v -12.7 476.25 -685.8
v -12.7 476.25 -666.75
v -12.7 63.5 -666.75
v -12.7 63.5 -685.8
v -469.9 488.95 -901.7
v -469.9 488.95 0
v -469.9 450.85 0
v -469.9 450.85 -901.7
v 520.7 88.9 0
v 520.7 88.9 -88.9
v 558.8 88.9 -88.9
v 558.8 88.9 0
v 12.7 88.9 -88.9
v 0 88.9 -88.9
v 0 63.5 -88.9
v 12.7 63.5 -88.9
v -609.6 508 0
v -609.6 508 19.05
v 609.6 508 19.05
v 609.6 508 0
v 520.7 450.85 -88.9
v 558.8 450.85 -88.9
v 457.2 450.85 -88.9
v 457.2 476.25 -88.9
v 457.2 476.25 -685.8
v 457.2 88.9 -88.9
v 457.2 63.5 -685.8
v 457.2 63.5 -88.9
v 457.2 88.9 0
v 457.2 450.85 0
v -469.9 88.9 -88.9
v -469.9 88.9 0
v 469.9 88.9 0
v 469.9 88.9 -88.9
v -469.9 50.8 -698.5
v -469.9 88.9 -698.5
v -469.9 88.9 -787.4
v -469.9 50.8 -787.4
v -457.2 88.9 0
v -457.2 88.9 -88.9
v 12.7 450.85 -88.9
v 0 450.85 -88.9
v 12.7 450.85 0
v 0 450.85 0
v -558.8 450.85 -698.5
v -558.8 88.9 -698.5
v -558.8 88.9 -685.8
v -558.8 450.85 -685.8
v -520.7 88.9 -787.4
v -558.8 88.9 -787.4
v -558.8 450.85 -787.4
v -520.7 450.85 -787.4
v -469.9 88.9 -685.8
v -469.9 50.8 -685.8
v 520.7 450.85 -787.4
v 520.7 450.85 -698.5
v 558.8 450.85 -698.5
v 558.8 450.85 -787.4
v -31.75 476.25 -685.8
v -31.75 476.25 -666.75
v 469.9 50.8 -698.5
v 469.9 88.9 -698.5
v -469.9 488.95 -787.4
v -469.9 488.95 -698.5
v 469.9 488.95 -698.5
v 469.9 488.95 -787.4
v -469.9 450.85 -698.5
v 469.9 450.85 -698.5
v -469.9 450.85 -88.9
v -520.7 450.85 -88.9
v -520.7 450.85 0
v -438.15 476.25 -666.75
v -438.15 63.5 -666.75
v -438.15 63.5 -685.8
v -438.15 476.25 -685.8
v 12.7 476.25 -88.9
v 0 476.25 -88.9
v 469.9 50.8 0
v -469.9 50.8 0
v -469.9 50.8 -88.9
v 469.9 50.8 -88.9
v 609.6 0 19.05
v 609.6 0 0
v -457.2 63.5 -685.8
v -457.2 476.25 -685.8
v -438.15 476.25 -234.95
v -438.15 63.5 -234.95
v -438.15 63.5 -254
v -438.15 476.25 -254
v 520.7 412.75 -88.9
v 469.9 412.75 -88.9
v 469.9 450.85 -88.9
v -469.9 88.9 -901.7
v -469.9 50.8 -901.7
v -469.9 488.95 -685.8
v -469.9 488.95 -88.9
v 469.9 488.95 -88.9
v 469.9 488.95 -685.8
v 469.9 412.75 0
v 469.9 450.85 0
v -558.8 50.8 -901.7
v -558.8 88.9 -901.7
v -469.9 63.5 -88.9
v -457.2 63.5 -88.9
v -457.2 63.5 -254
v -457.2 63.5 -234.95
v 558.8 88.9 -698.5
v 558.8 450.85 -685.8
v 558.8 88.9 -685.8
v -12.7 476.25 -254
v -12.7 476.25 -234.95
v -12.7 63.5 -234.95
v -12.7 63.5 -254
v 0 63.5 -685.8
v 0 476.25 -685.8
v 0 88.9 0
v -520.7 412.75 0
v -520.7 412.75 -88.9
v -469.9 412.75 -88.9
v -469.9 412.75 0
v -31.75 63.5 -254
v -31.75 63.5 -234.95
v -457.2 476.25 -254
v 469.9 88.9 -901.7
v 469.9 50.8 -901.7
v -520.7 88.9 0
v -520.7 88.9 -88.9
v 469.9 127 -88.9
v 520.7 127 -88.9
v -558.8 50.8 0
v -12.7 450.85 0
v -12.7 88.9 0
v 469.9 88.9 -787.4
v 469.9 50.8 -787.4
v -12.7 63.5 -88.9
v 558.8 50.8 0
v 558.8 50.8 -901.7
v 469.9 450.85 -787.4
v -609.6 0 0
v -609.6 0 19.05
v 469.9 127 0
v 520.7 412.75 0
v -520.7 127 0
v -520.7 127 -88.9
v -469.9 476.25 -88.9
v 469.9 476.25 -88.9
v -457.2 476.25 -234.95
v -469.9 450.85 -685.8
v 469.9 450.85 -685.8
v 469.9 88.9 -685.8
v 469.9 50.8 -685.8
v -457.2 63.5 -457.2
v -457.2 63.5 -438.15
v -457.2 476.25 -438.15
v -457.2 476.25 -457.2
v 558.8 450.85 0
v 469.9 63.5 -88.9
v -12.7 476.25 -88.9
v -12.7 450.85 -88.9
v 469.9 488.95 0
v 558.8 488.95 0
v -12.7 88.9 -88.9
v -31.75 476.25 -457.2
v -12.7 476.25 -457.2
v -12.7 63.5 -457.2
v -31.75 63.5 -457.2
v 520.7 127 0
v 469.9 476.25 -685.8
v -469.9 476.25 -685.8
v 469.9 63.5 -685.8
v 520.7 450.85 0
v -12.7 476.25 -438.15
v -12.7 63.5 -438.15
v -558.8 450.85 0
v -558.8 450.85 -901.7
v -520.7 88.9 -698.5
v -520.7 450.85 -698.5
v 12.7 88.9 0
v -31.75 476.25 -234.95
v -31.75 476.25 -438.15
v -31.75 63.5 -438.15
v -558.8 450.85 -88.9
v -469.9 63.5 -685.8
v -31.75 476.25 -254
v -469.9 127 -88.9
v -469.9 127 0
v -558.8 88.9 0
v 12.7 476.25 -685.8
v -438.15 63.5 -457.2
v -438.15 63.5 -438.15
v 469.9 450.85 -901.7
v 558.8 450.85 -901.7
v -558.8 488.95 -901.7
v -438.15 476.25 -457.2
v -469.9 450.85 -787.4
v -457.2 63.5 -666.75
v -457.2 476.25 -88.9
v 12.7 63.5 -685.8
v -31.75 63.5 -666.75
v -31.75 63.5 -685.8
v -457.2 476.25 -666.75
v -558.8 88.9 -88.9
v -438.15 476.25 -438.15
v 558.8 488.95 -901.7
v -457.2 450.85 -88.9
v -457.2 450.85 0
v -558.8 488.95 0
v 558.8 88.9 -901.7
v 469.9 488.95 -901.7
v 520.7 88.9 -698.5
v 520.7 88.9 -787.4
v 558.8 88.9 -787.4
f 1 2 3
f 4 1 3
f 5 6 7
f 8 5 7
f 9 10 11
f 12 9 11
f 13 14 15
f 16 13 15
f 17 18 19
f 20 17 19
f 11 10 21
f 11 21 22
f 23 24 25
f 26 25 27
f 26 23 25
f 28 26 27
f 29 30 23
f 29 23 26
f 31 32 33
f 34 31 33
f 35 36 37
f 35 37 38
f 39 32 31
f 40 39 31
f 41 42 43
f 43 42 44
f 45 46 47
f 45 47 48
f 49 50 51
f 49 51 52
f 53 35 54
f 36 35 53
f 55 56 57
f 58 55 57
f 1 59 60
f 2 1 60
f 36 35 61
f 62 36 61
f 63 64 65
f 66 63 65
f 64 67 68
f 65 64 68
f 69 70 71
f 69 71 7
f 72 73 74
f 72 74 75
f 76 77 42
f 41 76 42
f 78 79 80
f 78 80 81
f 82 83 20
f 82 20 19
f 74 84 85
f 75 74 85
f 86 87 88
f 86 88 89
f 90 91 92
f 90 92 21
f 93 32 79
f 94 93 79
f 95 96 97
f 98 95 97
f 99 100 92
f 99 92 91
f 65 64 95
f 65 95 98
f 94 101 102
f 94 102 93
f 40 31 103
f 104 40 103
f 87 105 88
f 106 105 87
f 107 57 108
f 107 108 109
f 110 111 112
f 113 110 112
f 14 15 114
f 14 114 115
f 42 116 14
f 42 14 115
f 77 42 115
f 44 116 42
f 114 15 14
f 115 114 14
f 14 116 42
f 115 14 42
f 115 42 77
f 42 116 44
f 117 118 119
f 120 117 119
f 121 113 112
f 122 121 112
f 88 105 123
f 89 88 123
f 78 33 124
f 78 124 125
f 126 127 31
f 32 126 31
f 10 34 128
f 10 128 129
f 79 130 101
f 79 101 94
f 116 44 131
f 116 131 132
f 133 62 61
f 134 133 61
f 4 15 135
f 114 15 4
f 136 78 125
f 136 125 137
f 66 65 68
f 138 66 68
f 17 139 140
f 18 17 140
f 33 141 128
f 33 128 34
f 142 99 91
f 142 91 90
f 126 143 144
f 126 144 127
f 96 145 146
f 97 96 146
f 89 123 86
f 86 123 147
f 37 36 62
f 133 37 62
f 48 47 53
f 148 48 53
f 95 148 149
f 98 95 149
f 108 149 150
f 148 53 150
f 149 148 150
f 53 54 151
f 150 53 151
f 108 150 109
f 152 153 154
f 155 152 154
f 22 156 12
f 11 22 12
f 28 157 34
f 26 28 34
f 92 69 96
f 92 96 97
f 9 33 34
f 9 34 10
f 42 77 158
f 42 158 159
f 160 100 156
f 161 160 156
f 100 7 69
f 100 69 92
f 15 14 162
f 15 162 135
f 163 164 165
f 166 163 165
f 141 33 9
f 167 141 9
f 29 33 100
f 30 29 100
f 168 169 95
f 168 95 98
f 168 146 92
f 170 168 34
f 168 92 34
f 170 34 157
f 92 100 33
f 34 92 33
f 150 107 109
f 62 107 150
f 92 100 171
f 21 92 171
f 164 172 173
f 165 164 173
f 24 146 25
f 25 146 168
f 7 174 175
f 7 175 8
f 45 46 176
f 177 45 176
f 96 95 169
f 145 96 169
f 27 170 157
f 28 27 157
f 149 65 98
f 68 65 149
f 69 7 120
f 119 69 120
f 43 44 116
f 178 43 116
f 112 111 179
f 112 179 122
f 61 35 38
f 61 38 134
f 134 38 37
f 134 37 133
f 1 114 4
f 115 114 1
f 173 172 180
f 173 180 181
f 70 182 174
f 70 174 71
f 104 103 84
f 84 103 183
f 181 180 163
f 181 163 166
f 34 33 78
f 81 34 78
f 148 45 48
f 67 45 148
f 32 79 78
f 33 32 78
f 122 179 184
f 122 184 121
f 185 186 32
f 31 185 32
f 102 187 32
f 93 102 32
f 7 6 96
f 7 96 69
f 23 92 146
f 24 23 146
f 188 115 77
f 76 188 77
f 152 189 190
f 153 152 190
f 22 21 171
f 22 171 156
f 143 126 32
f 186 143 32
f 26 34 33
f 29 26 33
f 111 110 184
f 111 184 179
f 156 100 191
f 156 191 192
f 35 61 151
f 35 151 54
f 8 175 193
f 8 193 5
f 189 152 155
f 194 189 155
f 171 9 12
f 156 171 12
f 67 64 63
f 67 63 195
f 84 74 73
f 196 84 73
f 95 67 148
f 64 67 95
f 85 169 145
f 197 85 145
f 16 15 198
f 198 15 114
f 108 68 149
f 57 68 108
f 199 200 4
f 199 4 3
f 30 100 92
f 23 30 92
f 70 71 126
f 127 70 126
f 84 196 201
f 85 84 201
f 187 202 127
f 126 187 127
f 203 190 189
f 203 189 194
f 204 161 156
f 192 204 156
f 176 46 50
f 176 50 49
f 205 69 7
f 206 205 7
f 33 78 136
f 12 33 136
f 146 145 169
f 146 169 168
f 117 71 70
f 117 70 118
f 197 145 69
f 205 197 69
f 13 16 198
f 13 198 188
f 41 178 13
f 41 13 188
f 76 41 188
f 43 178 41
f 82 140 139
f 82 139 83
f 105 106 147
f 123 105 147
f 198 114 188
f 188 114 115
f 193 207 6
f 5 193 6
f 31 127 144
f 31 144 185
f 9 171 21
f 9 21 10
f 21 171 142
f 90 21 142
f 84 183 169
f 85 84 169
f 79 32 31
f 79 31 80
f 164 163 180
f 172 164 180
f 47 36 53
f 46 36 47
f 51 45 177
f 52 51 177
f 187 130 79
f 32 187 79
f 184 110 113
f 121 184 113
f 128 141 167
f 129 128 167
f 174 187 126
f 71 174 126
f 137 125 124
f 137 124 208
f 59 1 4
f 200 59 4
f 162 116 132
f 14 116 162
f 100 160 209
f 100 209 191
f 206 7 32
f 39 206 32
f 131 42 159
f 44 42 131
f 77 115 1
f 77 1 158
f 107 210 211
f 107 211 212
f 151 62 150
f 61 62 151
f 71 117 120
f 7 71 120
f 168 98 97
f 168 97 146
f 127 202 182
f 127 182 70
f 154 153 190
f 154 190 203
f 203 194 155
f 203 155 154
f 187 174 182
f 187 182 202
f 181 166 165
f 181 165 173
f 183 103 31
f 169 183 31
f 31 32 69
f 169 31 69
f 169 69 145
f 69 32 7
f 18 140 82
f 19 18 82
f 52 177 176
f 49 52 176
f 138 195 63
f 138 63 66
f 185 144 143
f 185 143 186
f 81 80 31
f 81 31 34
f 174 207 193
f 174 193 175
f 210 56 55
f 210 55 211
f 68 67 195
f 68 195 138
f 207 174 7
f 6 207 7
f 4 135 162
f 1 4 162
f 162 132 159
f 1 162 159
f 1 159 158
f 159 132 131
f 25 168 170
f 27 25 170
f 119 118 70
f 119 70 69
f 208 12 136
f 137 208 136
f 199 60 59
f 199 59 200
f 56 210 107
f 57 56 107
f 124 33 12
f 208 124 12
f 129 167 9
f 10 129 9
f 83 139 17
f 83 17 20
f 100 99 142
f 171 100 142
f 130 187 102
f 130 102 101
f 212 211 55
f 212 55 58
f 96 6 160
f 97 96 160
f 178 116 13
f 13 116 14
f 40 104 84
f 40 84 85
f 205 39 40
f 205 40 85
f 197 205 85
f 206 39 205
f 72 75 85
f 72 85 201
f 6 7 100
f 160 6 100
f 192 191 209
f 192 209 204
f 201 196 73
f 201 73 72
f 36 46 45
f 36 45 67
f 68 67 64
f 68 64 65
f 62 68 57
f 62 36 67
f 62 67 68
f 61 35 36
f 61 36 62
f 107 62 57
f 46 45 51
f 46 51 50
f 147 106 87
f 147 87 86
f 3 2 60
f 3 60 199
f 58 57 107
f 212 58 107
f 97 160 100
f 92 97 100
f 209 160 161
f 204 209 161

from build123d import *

# Parameters (mm, degrees)
F0_W      = 1219.2
F0_H      = 19.05
F1_DEPTH  = 508
F3_W      = 88.9
F3_H      = 38.1
F4_DEPTH  = 901.7
F6_W      = 939.8
F6_H      = 38.1
F7_DEPTH  = 88.9
F5_W      = 939.8
F5_H      = 38.1
F8_DEPTH  = 88.9
F9_W      = 38.1
F9_H      = 361.95
F10_DEPTH = 88.9
F11_W     = 50.8
F11_H     = 38.1
F12_DEPTH = 88.9
F14_W     = 939.8
F14_H     = 38.1
F15_DEPTH = 88.9
F16_W     = 38.1
F16_H     = 361.95
F17_DEPTH = 88.9
F19_DEPTH = 12.7
F21_DEPTH = 12.7
F22_DEPTH = 12.7
F24_DEPTH = 12.7
F26_DEPTH = 12.7
F27_W     = 939.8
F27_H     = 12.7
F28_DEPTH = 596.9
F30_W     = 412.75
F30_H     = 19.05
F31_DEPTH = 19.05
F32_W     = 412.75
F32_H     = 19.05
F33_DEPTH = 19.05


with BuildPart() as f1:
    # F0 (on Front) → F1 (new body)
    with BuildSketch(Plane.XZ):
        with Locations((0, 9.525)):
            Rectangle(F0_W, F0_H)
    extrude(amount=-F1_DEPTH)


with BuildPart() as f4:
    # F3 (on face) → F4 (new body)
    with BuildSketch(Plane(origin=(0, 0, 0), x_dir=(1, 0, 0), z_dir=(0, 0, -1))):
        with Locations((514.35, -69.85)):
            Rectangle(F3_W, F3_H)
    extrude(amount=F4_DEPTH)


with BuildPart() as f4b:
    # F3 (on face) → F4, piece 2 (new body)
    with BuildSketch(Plane(origin=(0, 0, 0), x_dir=(1, 0, 0), z_dir=(0, 0, -1))):
        with Locations((-514.35, -69.85)):
            Rectangle(F3_W, F3_H)
    extrude(amount=F4_DEPTH)


with BuildPart() as f4c:
    # F3 (on face) → F4, piece 3 (new body)
    with BuildSketch(Plane(origin=(0, 0, 0), x_dir=(1, 0, 0), z_dir=(0, 0, -1))):
        with Locations((-514.35, -469.9)):
            Rectangle(F3_W, F3_H)
    extrude(amount=F4_DEPTH)


with BuildPart() as f4d:
    # F3 (on face) → F4, piece 4 (new body)
    with BuildSketch(Plane(origin=(0, 0, 0), x_dir=(1, 0, 0), z_dir=(0, 0, -1))):
        with Locations((514.35, -469.9)):
            Rectangle(F3_W, F3_H)
    extrude(amount=F4_DEPTH)


with BuildPart() as f7:
    # F6 (on face) → F7 (new body)
    with BuildSketch(Plane(origin=(0, 0, 0), x_dir=(1, 0, 0), z_dir=(0, 0, -1))):
        with Locations((0, -469.9)):
            Rectangle(F6_W, F6_H)
    extrude(amount=F7_DEPTH)


with BuildPart() as f8:
    # F5 (on face) → F8 (new body)
    with BuildSketch(Plane(origin=(0, 0, 0), x_dir=(1, 0, 0), z_dir=(0, 0, -1))):
        with Locations((0, -69.85)):
            Rectangle(F5_W, F5_H)
    extrude(amount=F8_DEPTH)


with BuildPart() as f10:
    # F9 (on face) → F10 (new body)
    with BuildSketch(Plane(origin=(0, 0, 0), x_dir=(1, 0, 0), z_dir=(0, 0, -1))):
        with Locations((-539.75, -269.875)):
            Rectangle(F9_W, F9_H)
    extrude(amount=F10_DEPTH)


with BuildPart() as f10b:
    # F9 (on face) → F10, piece 2 (new body)
    with BuildSketch(Plane(origin=(0, 0, 0), x_dir=(1, 0, 0), z_dir=(0, 0, -1))):
        with Locations((539.75, -269.875)):
            Rectangle(F9_W, F9_H)
    extrude(amount=F10_DEPTH)


with BuildPart() as f12:
    # F11 (on face) → F12 (new body)
    with BuildSketch(Plane(origin=(0, 0, 0), x_dir=(1, 0, 0), z_dir=(0, 0, -1))):
        with Locations((-495.3, -107.95)):
            Rectangle(F11_W, F11_H)
    extrude(amount=F12_DEPTH)


with BuildPart() as f12b:
    # F11 (on face) → F12, piece 2 (new body)
    with BuildSketch(Plane(origin=(0, 0, 0), x_dir=(1, 0, 0), z_dir=(0, 0, -1))):
        with Locations((-495.3, -431.8)):
            Rectangle(F11_W, F11_H)
    extrude(amount=F12_DEPTH)


with BuildPart() as f12c:
    # F11 (on face) → F12, piece 3 (new body)
    with BuildSketch(Plane(origin=(0, 0, 0), x_dir=(1, 0, 0), z_dir=(0, 0, -1))):
        with Locations((495.3, -107.95)):
            Rectangle(F11_W, F11_H)
    extrude(amount=F12_DEPTH)


with BuildPart() as f12d:
    # F11 (on face) → F12, piece 4 (new body)
    with BuildSketch(Plane(origin=(0, 0, 0), x_dir=(1, 0, 0), z_dir=(0, 0, -1))):
        with Locations((495.3, -431.8)):
            Rectangle(F11_W, F11_H)
    extrude(amount=F12_DEPTH)


with BuildPart() as f15:
    # F14 (on offset) → F15 (new body)
    with BuildSketch(Plane(origin=(0, 0, -698.5), x_dir=(1, 0, 0), z_dir=(0, 0, -1))):
        with Locations((0, -69.85)):
            Rectangle(F14_W, F14_H)
    extrude(amount=F15_DEPTH)


with BuildPart() as f15b:
    # F14 (on offset) → F15, piece 2 (new body)
    with BuildSketch(Plane(origin=(0, 0, -698.5), x_dir=(1, 0, 0), z_dir=(0, 0, -1))):
        with Locations((0, -469.9)):
            Rectangle(F14_W, F14_H)
    extrude(amount=F15_DEPTH)


with BuildPart() as f17:
    # F16 (on offset) → F17 (new body)
    with BuildSketch(Plane(origin=(0, 0, -698.5), x_dir=(1, 0, 0), z_dir=(0, 0, -1))):
        with Locations((-539.75, -269.875)):
            Rectangle(F16_W, F16_H)
    extrude(amount=F17_DEPTH)


with BuildPart() as f17b:
    # F16 (on offset) → F17, piece 2 (new body)
    with BuildSketch(Plane(origin=(0, 0, -698.5), x_dir=(1, 0, 0), z_dir=(0, 0, -1))):
        with Locations((539.75, -269.875)):
            Rectangle(F16_W, F16_H)
    extrude(amount=F17_DEPTH)


with BuildPart() as f19:
    # F18 (on offset) → F19 (new body)
    with BuildSketch(Plane(origin=(0, 0, -698.5), x_dir=(1, 0, 0), z_dir=(0, 0, -1))):
        Polygon((469.9, -450.85), (558.8, -450.85), (558.8, -88.9), (469.9, -88.9), (469.9, -50.8), (-469.9, -50.8), (-469.9, -88.9), (-558.8, -88.9), (-558.8, -450.85), (-469.9, -450.85), (-469.9, -488.95), (469.9, -488.95), align=None)
    extrude(amount=-F19_DEPTH)


with BuildPart() as f21:
    # F20 (on Right) → F21 (new body)
    with BuildSketch(Plane.YZ):
        Polygon((450.85, -88.9), (450.85, 0), (88.9, 0), (88.9, -88.9), (63.5, -88.9), (63.5, -685.8), (476.25, -685.8), (476.25, -88.9), align=None)
    extrude(amount=F21_DEPTH)


with BuildPart() as f22:
    # F20 (on Right) → F22 (new body)
    with BuildSketch(Plane.YZ):
        Polygon((450.85, -88.9), (450.85, 0), (88.9, 0), (88.9, -88.9), (63.5, -88.9), (63.5, -685.8), (476.25, -685.8), (476.25, -88.9), align=None)
    extrude(amount=-F22_DEPTH)


with BuildPart() as f24:
    # F23 (on face) → F24 (new body)
    with BuildSketch(Plane.YZ.offset(-469.9)):
        Polygon((450.85, -88.9), (450.85, 0), (88.9, 0), (88.9, -88.9), (63.5, -88.9), (63.5, -685.8), (476.25, -685.8), (476.25, -88.9), align=None)
    extrude(amount=F24_DEPTH)


with BuildPart() as f26:
    # F25 (on face) → F26 (new body)
    with BuildSketch(Plane(origin=(469.9, 0, 0), x_dir=(0, -1, 0), z_dir=(-1, 0, 0))):
        Polygon((-88.9, 0), (-450.85, 0), (-450.85, -88.9), (-476.25, -88.9), (-476.25, -685.8), (-63.5, -685.8), (-63.5, -88.9), (-88.9, -88.9), align=None)
    extrude(amount=F26_DEPTH)


with BuildPart() as f28:
    # F27 (on face) → F28 (new body)
    with BuildSketch(Plane(origin=(0, 0, -88.9), x_dir=(1, 0, 0), z_dir=(0, 0, -1))):
        with Locations((0, -482.6)):
            Rectangle(F27_W, F27_H)
    extrude(amount=F28_DEPTH)


with BuildPart() as f31:
    # F30 (on face) → F31 (new body)
    with BuildSketch(Plane.YZ.offset(-457.2)):
        with Locations((269.875, -244.475)):
            Rectangle(F30_W, F30_H)
    extrude(amount=F31_DEPTH)


with BuildPart() as f31b:
    # F30 (on face) → F31, piece 2 (new body)
    with BuildSketch(Plane.YZ.offset(-457.2)):
        with Locations((269.875, -447.675)):
            Rectangle(F30_W, F30_H)
    extrude(amount=F31_DEPTH)


with BuildPart() as f31c:
    # F30 (on face) → F31, piece 3 (new body)
    with BuildSketch(Plane.YZ.offset(-457.2)):
        with Locations((269.875, -676.275)):
            Rectangle(F30_W, F30_H)
    extrude(amount=F31_DEPTH)


with BuildPart() as f33:
    # F32 (on face) → F33 (new body)
    with BuildSketch(Plane(origin=(-12.7, 0, 0), x_dir=(0, -1, 0), z_dir=(-1, 0, 0))):
        with Locations((-269.875, -244.475)):
            Rectangle(F32_W, F32_H)
    extrude(amount=F33_DEPTH)


with BuildPart() as f33b:
    # F32 (on face) → F33, piece 2 (new body)
    with BuildSketch(Plane(origin=(-12.7, 0, 0), x_dir=(0, -1, 0), z_dir=(-1, 0, 0))):
        with Locations((-269.875, -447.675)):
            Rectangle(F32_W, F32_H)
    extrude(amount=F33_DEPTH)


with BuildPart() as f33c:
    # F32 (on face) → F33, piece 3 (new body)
    with BuildSketch(Plane(origin=(-12.7, 0, 0), x_dir=(0, -1, 0), z_dir=(-1, 0, 0))):
        with Locations((-269.875, -676.275)):
            Rectangle(F32_W, F32_H)
    extrude(amount=F33_DEPTH)


solid = Compound([f1.part, f4.part, f4b.part, f4c.part, f4d.part, f7.part, f8.part, f10.part, f10b.part, f12.part, f12b.part, f12c.part, f12d.part, f15.part, f15b.part, f17.part, f17b.part, f19.part, f21.part, f22.part, f24.part, f26.part, f28.part, f31.part, f31b.part, f31c.part, f33.part, f33b.part, f33c.part])
